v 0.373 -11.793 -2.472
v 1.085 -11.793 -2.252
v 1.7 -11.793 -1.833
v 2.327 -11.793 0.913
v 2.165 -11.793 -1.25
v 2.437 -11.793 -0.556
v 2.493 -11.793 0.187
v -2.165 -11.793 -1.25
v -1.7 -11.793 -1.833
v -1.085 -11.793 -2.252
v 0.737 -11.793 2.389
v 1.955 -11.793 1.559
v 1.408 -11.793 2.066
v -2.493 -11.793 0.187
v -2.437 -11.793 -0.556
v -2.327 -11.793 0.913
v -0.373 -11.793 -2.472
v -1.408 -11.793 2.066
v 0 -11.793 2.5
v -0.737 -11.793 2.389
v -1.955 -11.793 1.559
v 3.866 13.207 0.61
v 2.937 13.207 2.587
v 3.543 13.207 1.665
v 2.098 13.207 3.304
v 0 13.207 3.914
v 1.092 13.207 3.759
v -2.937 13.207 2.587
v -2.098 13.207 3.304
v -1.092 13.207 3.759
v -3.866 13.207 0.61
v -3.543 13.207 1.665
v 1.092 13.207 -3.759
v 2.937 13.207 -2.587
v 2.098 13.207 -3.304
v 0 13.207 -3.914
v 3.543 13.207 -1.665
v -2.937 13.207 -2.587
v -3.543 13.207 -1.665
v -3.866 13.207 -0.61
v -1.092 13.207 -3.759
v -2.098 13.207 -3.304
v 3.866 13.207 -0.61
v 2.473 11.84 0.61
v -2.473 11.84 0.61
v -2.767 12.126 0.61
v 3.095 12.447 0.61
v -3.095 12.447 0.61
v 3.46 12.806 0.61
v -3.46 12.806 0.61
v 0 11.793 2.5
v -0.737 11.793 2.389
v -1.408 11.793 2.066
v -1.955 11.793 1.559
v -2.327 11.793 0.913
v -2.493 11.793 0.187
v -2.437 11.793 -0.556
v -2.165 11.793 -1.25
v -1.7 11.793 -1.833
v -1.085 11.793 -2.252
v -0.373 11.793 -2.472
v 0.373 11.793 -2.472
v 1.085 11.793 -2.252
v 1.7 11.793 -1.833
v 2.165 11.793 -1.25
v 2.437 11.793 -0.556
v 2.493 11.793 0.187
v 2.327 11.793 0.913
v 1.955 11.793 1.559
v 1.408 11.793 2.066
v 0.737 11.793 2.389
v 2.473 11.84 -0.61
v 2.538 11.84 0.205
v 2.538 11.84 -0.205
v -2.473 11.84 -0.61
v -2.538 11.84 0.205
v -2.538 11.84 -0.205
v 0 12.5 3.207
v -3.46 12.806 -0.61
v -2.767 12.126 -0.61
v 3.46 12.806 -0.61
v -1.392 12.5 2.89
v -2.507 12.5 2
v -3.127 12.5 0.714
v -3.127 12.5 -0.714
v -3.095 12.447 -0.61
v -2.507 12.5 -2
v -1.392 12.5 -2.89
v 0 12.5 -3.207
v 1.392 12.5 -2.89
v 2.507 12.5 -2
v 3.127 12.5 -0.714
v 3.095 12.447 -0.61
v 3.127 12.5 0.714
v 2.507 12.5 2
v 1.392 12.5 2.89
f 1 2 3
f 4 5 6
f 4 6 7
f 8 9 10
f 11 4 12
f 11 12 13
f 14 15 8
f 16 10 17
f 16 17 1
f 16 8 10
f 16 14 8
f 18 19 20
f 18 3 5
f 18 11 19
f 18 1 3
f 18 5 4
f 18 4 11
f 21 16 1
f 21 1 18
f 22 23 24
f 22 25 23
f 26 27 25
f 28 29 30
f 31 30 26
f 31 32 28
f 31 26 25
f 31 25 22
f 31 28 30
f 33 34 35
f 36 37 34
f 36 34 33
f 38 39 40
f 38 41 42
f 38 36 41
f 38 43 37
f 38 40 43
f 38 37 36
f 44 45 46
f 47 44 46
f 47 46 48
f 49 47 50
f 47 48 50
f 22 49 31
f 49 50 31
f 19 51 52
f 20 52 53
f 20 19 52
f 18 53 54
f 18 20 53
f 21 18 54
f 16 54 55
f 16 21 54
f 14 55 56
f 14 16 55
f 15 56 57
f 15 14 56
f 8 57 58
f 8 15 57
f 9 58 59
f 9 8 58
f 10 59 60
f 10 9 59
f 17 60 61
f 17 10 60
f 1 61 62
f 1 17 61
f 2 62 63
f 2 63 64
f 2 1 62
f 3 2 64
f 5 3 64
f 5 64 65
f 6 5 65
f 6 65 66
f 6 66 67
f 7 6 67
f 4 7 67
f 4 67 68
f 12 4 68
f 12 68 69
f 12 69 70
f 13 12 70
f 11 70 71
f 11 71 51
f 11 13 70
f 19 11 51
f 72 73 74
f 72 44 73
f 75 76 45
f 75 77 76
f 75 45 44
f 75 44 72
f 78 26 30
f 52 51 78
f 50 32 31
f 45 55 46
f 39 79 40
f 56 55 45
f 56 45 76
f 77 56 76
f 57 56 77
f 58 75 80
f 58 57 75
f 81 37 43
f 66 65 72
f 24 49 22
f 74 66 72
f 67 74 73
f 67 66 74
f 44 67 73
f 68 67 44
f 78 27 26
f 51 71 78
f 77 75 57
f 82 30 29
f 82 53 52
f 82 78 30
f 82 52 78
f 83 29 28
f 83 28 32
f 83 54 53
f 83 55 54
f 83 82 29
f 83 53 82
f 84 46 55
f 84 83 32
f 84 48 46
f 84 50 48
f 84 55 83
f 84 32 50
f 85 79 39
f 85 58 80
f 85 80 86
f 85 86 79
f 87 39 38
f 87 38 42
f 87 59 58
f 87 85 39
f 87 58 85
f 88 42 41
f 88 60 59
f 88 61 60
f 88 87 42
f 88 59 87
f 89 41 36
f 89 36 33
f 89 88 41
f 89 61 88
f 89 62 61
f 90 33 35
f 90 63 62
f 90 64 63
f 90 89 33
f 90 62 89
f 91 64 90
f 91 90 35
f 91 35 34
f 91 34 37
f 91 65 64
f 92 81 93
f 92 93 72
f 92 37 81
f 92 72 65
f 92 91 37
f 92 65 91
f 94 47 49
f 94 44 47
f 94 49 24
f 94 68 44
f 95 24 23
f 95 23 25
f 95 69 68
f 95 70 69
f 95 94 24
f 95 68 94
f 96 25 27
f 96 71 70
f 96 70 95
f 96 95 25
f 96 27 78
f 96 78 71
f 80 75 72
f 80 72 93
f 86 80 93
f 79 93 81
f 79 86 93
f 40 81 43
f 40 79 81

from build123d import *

# Parameters (mm, degrees)
CUT_EXTRUDE1_DEPTH      = 15.320258557
CUT_EXTRUDE1_DEPTH_BACK = 15.320258557
SKETCH2_W               = 1.219880404
SKETCH2_H               = 2.734998975


with BuildPart() as part:
    # Sketch1 → Revolve1 (revolve)
    with BuildSketch(Plane.XY, mode=Mode.PRIVATE) as revolve1_sk:
        Polygon((0, 13.207106781), (-3.914213562, 13.207106781), (-2.5, 11.792893219), (-2.5, -11.792893219), (0, -11.792893219), align=None)
    revolve(revolve1_sk.sketch.rotate(Axis((0, 14.992211838, 0), (0, -1, 0)), 270), axis=Axis((0, 14.992211838, 0), (0, -1, 0)))

    # Sketch2 → Cut-Extrude1 (cut, two sides: drawn at the far end of the back side and taken through both)
    with BuildSketch(Plane(origin=(0, 0, 0), x_dir=(0, 0, -1), z_dir=(1, 0, 0)).offset(-CUT_EXTRUDE1_DEPTH_BACK)):
        with Locations((0, 13.207106782)):
            Rectangle(SKETCH2_W, SKETCH2_H)
    extrude(amount=CUT_EXTRUDE1_DEPTH + CUT_EXTRUDE1_DEPTH_BACK, mode=Mode.SUBTRACT)


solid = part.part
